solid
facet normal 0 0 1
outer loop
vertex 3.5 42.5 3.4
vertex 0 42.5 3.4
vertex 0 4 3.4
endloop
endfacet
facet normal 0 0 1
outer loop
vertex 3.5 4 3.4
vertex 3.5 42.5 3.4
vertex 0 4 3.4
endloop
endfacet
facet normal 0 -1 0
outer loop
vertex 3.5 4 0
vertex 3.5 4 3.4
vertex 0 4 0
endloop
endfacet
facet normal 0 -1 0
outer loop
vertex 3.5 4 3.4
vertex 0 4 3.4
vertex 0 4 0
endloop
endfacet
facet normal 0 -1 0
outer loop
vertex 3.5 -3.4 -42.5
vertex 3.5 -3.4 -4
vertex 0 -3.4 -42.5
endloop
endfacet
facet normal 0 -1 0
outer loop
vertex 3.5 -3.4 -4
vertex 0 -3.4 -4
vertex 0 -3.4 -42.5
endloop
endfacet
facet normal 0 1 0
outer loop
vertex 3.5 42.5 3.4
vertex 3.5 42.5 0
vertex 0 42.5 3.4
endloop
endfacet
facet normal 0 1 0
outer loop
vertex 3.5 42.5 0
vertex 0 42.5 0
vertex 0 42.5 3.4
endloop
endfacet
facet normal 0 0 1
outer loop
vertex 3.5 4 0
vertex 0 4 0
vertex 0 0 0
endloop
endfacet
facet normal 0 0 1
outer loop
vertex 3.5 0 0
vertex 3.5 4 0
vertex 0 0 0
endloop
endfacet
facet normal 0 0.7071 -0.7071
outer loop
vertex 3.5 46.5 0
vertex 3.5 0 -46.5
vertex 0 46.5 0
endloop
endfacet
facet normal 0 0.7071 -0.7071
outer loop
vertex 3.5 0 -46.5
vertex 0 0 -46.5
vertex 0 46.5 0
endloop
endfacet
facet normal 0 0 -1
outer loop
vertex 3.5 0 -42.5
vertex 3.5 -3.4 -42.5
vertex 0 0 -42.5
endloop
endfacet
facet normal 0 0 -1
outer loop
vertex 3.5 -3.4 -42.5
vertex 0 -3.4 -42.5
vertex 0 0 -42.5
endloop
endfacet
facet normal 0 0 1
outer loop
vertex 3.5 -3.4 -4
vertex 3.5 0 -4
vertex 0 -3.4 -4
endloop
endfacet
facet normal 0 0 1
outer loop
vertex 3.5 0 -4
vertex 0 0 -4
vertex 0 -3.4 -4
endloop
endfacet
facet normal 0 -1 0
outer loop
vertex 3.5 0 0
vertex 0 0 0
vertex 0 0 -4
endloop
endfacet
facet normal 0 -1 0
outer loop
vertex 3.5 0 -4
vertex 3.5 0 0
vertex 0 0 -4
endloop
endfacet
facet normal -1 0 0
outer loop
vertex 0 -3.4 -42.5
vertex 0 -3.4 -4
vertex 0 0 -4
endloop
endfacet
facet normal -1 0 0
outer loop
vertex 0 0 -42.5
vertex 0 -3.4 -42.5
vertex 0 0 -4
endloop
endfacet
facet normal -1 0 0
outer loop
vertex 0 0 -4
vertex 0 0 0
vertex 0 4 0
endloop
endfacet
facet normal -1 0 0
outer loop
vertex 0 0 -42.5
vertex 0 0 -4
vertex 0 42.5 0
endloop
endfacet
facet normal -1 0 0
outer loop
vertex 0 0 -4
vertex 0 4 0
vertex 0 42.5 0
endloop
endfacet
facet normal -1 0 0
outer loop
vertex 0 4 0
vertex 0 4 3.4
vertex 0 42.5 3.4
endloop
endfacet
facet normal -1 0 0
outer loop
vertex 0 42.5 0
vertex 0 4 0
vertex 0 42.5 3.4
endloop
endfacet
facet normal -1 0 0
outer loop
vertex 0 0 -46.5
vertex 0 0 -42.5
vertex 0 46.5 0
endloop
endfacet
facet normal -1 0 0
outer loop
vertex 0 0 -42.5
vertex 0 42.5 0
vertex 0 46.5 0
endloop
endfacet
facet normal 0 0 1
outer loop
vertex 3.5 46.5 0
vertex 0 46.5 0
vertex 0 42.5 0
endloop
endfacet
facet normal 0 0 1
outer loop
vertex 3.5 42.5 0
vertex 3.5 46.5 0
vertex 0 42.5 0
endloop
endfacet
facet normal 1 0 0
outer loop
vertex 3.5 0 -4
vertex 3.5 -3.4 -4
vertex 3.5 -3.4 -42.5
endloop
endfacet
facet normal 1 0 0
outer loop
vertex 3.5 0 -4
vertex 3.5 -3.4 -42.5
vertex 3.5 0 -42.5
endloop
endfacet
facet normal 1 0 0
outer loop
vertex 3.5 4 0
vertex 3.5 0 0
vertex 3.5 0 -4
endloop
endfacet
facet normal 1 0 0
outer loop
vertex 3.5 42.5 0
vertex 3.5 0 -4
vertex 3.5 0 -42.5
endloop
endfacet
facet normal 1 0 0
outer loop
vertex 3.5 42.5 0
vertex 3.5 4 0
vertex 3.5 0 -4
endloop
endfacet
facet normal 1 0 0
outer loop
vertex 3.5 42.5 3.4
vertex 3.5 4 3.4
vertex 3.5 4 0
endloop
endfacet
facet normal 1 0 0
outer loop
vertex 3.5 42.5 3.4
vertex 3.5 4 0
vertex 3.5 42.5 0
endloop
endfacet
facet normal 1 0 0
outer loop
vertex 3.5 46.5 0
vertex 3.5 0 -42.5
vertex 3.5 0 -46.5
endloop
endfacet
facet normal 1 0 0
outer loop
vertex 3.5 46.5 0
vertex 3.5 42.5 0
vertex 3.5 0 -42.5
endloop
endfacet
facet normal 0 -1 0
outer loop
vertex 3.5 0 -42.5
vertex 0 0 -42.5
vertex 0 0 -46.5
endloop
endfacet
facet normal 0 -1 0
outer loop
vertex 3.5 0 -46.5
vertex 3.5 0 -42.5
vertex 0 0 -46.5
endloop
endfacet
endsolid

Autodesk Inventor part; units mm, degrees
ref_plane "YZ Plane" through (0, 0, 0) normal (1, 0, 0) x (0, 1, 0)
ref_plane "XZ Plane" through (0, 0, 0) normal (0, 1, 0) x (-1, 0, 0)
ref_plane "XY Plane" through (0, 0, 0) normal (0, 0, 1) x (1, 0, 0)
sketch "스케치1" plane through (0, 0, 0) normal (1, 0, 0) x (0, 1, 0)
  line L0 (0, -46.5) -> (46.5, 0)
  line L1 (0, -4) -> (-3.4, -4)
  line L2 (-3.4, -4) -> (-3.4, -42.5)
  line L3 (-3.4, -42.5) -> (0, -42.5)
  line L4 (0, 0) -> (0, -4)
  line L5 (0, -42.5) -> (0, -46.5)
  line L6 (42.5, 0) -> (42.5, 3.4)
  line L7 (42.5, 3.4) -> (4, 3.4)
  line L8 (4, 3.4) -> (4, 0)
  line L9 (46.5, 0) -> (42.5, 0)
  line L10 (4, 0) -> (0, 0)
  point P0 (4, 1.7)
  point P1 (0, -44.5)
  dimension "d1" = 46.5
  dimension "d2" = 38.5
  dimension "d4" = 38.5
  dimension "d5" = 3.4
  dimension "d6" = 4
  dimension "d7" = 3.4
  dimension "d8" = 46.5
extrude "돌출1" add sketch "스케치1" along normal blind 3.5
properties part number "supporter"
